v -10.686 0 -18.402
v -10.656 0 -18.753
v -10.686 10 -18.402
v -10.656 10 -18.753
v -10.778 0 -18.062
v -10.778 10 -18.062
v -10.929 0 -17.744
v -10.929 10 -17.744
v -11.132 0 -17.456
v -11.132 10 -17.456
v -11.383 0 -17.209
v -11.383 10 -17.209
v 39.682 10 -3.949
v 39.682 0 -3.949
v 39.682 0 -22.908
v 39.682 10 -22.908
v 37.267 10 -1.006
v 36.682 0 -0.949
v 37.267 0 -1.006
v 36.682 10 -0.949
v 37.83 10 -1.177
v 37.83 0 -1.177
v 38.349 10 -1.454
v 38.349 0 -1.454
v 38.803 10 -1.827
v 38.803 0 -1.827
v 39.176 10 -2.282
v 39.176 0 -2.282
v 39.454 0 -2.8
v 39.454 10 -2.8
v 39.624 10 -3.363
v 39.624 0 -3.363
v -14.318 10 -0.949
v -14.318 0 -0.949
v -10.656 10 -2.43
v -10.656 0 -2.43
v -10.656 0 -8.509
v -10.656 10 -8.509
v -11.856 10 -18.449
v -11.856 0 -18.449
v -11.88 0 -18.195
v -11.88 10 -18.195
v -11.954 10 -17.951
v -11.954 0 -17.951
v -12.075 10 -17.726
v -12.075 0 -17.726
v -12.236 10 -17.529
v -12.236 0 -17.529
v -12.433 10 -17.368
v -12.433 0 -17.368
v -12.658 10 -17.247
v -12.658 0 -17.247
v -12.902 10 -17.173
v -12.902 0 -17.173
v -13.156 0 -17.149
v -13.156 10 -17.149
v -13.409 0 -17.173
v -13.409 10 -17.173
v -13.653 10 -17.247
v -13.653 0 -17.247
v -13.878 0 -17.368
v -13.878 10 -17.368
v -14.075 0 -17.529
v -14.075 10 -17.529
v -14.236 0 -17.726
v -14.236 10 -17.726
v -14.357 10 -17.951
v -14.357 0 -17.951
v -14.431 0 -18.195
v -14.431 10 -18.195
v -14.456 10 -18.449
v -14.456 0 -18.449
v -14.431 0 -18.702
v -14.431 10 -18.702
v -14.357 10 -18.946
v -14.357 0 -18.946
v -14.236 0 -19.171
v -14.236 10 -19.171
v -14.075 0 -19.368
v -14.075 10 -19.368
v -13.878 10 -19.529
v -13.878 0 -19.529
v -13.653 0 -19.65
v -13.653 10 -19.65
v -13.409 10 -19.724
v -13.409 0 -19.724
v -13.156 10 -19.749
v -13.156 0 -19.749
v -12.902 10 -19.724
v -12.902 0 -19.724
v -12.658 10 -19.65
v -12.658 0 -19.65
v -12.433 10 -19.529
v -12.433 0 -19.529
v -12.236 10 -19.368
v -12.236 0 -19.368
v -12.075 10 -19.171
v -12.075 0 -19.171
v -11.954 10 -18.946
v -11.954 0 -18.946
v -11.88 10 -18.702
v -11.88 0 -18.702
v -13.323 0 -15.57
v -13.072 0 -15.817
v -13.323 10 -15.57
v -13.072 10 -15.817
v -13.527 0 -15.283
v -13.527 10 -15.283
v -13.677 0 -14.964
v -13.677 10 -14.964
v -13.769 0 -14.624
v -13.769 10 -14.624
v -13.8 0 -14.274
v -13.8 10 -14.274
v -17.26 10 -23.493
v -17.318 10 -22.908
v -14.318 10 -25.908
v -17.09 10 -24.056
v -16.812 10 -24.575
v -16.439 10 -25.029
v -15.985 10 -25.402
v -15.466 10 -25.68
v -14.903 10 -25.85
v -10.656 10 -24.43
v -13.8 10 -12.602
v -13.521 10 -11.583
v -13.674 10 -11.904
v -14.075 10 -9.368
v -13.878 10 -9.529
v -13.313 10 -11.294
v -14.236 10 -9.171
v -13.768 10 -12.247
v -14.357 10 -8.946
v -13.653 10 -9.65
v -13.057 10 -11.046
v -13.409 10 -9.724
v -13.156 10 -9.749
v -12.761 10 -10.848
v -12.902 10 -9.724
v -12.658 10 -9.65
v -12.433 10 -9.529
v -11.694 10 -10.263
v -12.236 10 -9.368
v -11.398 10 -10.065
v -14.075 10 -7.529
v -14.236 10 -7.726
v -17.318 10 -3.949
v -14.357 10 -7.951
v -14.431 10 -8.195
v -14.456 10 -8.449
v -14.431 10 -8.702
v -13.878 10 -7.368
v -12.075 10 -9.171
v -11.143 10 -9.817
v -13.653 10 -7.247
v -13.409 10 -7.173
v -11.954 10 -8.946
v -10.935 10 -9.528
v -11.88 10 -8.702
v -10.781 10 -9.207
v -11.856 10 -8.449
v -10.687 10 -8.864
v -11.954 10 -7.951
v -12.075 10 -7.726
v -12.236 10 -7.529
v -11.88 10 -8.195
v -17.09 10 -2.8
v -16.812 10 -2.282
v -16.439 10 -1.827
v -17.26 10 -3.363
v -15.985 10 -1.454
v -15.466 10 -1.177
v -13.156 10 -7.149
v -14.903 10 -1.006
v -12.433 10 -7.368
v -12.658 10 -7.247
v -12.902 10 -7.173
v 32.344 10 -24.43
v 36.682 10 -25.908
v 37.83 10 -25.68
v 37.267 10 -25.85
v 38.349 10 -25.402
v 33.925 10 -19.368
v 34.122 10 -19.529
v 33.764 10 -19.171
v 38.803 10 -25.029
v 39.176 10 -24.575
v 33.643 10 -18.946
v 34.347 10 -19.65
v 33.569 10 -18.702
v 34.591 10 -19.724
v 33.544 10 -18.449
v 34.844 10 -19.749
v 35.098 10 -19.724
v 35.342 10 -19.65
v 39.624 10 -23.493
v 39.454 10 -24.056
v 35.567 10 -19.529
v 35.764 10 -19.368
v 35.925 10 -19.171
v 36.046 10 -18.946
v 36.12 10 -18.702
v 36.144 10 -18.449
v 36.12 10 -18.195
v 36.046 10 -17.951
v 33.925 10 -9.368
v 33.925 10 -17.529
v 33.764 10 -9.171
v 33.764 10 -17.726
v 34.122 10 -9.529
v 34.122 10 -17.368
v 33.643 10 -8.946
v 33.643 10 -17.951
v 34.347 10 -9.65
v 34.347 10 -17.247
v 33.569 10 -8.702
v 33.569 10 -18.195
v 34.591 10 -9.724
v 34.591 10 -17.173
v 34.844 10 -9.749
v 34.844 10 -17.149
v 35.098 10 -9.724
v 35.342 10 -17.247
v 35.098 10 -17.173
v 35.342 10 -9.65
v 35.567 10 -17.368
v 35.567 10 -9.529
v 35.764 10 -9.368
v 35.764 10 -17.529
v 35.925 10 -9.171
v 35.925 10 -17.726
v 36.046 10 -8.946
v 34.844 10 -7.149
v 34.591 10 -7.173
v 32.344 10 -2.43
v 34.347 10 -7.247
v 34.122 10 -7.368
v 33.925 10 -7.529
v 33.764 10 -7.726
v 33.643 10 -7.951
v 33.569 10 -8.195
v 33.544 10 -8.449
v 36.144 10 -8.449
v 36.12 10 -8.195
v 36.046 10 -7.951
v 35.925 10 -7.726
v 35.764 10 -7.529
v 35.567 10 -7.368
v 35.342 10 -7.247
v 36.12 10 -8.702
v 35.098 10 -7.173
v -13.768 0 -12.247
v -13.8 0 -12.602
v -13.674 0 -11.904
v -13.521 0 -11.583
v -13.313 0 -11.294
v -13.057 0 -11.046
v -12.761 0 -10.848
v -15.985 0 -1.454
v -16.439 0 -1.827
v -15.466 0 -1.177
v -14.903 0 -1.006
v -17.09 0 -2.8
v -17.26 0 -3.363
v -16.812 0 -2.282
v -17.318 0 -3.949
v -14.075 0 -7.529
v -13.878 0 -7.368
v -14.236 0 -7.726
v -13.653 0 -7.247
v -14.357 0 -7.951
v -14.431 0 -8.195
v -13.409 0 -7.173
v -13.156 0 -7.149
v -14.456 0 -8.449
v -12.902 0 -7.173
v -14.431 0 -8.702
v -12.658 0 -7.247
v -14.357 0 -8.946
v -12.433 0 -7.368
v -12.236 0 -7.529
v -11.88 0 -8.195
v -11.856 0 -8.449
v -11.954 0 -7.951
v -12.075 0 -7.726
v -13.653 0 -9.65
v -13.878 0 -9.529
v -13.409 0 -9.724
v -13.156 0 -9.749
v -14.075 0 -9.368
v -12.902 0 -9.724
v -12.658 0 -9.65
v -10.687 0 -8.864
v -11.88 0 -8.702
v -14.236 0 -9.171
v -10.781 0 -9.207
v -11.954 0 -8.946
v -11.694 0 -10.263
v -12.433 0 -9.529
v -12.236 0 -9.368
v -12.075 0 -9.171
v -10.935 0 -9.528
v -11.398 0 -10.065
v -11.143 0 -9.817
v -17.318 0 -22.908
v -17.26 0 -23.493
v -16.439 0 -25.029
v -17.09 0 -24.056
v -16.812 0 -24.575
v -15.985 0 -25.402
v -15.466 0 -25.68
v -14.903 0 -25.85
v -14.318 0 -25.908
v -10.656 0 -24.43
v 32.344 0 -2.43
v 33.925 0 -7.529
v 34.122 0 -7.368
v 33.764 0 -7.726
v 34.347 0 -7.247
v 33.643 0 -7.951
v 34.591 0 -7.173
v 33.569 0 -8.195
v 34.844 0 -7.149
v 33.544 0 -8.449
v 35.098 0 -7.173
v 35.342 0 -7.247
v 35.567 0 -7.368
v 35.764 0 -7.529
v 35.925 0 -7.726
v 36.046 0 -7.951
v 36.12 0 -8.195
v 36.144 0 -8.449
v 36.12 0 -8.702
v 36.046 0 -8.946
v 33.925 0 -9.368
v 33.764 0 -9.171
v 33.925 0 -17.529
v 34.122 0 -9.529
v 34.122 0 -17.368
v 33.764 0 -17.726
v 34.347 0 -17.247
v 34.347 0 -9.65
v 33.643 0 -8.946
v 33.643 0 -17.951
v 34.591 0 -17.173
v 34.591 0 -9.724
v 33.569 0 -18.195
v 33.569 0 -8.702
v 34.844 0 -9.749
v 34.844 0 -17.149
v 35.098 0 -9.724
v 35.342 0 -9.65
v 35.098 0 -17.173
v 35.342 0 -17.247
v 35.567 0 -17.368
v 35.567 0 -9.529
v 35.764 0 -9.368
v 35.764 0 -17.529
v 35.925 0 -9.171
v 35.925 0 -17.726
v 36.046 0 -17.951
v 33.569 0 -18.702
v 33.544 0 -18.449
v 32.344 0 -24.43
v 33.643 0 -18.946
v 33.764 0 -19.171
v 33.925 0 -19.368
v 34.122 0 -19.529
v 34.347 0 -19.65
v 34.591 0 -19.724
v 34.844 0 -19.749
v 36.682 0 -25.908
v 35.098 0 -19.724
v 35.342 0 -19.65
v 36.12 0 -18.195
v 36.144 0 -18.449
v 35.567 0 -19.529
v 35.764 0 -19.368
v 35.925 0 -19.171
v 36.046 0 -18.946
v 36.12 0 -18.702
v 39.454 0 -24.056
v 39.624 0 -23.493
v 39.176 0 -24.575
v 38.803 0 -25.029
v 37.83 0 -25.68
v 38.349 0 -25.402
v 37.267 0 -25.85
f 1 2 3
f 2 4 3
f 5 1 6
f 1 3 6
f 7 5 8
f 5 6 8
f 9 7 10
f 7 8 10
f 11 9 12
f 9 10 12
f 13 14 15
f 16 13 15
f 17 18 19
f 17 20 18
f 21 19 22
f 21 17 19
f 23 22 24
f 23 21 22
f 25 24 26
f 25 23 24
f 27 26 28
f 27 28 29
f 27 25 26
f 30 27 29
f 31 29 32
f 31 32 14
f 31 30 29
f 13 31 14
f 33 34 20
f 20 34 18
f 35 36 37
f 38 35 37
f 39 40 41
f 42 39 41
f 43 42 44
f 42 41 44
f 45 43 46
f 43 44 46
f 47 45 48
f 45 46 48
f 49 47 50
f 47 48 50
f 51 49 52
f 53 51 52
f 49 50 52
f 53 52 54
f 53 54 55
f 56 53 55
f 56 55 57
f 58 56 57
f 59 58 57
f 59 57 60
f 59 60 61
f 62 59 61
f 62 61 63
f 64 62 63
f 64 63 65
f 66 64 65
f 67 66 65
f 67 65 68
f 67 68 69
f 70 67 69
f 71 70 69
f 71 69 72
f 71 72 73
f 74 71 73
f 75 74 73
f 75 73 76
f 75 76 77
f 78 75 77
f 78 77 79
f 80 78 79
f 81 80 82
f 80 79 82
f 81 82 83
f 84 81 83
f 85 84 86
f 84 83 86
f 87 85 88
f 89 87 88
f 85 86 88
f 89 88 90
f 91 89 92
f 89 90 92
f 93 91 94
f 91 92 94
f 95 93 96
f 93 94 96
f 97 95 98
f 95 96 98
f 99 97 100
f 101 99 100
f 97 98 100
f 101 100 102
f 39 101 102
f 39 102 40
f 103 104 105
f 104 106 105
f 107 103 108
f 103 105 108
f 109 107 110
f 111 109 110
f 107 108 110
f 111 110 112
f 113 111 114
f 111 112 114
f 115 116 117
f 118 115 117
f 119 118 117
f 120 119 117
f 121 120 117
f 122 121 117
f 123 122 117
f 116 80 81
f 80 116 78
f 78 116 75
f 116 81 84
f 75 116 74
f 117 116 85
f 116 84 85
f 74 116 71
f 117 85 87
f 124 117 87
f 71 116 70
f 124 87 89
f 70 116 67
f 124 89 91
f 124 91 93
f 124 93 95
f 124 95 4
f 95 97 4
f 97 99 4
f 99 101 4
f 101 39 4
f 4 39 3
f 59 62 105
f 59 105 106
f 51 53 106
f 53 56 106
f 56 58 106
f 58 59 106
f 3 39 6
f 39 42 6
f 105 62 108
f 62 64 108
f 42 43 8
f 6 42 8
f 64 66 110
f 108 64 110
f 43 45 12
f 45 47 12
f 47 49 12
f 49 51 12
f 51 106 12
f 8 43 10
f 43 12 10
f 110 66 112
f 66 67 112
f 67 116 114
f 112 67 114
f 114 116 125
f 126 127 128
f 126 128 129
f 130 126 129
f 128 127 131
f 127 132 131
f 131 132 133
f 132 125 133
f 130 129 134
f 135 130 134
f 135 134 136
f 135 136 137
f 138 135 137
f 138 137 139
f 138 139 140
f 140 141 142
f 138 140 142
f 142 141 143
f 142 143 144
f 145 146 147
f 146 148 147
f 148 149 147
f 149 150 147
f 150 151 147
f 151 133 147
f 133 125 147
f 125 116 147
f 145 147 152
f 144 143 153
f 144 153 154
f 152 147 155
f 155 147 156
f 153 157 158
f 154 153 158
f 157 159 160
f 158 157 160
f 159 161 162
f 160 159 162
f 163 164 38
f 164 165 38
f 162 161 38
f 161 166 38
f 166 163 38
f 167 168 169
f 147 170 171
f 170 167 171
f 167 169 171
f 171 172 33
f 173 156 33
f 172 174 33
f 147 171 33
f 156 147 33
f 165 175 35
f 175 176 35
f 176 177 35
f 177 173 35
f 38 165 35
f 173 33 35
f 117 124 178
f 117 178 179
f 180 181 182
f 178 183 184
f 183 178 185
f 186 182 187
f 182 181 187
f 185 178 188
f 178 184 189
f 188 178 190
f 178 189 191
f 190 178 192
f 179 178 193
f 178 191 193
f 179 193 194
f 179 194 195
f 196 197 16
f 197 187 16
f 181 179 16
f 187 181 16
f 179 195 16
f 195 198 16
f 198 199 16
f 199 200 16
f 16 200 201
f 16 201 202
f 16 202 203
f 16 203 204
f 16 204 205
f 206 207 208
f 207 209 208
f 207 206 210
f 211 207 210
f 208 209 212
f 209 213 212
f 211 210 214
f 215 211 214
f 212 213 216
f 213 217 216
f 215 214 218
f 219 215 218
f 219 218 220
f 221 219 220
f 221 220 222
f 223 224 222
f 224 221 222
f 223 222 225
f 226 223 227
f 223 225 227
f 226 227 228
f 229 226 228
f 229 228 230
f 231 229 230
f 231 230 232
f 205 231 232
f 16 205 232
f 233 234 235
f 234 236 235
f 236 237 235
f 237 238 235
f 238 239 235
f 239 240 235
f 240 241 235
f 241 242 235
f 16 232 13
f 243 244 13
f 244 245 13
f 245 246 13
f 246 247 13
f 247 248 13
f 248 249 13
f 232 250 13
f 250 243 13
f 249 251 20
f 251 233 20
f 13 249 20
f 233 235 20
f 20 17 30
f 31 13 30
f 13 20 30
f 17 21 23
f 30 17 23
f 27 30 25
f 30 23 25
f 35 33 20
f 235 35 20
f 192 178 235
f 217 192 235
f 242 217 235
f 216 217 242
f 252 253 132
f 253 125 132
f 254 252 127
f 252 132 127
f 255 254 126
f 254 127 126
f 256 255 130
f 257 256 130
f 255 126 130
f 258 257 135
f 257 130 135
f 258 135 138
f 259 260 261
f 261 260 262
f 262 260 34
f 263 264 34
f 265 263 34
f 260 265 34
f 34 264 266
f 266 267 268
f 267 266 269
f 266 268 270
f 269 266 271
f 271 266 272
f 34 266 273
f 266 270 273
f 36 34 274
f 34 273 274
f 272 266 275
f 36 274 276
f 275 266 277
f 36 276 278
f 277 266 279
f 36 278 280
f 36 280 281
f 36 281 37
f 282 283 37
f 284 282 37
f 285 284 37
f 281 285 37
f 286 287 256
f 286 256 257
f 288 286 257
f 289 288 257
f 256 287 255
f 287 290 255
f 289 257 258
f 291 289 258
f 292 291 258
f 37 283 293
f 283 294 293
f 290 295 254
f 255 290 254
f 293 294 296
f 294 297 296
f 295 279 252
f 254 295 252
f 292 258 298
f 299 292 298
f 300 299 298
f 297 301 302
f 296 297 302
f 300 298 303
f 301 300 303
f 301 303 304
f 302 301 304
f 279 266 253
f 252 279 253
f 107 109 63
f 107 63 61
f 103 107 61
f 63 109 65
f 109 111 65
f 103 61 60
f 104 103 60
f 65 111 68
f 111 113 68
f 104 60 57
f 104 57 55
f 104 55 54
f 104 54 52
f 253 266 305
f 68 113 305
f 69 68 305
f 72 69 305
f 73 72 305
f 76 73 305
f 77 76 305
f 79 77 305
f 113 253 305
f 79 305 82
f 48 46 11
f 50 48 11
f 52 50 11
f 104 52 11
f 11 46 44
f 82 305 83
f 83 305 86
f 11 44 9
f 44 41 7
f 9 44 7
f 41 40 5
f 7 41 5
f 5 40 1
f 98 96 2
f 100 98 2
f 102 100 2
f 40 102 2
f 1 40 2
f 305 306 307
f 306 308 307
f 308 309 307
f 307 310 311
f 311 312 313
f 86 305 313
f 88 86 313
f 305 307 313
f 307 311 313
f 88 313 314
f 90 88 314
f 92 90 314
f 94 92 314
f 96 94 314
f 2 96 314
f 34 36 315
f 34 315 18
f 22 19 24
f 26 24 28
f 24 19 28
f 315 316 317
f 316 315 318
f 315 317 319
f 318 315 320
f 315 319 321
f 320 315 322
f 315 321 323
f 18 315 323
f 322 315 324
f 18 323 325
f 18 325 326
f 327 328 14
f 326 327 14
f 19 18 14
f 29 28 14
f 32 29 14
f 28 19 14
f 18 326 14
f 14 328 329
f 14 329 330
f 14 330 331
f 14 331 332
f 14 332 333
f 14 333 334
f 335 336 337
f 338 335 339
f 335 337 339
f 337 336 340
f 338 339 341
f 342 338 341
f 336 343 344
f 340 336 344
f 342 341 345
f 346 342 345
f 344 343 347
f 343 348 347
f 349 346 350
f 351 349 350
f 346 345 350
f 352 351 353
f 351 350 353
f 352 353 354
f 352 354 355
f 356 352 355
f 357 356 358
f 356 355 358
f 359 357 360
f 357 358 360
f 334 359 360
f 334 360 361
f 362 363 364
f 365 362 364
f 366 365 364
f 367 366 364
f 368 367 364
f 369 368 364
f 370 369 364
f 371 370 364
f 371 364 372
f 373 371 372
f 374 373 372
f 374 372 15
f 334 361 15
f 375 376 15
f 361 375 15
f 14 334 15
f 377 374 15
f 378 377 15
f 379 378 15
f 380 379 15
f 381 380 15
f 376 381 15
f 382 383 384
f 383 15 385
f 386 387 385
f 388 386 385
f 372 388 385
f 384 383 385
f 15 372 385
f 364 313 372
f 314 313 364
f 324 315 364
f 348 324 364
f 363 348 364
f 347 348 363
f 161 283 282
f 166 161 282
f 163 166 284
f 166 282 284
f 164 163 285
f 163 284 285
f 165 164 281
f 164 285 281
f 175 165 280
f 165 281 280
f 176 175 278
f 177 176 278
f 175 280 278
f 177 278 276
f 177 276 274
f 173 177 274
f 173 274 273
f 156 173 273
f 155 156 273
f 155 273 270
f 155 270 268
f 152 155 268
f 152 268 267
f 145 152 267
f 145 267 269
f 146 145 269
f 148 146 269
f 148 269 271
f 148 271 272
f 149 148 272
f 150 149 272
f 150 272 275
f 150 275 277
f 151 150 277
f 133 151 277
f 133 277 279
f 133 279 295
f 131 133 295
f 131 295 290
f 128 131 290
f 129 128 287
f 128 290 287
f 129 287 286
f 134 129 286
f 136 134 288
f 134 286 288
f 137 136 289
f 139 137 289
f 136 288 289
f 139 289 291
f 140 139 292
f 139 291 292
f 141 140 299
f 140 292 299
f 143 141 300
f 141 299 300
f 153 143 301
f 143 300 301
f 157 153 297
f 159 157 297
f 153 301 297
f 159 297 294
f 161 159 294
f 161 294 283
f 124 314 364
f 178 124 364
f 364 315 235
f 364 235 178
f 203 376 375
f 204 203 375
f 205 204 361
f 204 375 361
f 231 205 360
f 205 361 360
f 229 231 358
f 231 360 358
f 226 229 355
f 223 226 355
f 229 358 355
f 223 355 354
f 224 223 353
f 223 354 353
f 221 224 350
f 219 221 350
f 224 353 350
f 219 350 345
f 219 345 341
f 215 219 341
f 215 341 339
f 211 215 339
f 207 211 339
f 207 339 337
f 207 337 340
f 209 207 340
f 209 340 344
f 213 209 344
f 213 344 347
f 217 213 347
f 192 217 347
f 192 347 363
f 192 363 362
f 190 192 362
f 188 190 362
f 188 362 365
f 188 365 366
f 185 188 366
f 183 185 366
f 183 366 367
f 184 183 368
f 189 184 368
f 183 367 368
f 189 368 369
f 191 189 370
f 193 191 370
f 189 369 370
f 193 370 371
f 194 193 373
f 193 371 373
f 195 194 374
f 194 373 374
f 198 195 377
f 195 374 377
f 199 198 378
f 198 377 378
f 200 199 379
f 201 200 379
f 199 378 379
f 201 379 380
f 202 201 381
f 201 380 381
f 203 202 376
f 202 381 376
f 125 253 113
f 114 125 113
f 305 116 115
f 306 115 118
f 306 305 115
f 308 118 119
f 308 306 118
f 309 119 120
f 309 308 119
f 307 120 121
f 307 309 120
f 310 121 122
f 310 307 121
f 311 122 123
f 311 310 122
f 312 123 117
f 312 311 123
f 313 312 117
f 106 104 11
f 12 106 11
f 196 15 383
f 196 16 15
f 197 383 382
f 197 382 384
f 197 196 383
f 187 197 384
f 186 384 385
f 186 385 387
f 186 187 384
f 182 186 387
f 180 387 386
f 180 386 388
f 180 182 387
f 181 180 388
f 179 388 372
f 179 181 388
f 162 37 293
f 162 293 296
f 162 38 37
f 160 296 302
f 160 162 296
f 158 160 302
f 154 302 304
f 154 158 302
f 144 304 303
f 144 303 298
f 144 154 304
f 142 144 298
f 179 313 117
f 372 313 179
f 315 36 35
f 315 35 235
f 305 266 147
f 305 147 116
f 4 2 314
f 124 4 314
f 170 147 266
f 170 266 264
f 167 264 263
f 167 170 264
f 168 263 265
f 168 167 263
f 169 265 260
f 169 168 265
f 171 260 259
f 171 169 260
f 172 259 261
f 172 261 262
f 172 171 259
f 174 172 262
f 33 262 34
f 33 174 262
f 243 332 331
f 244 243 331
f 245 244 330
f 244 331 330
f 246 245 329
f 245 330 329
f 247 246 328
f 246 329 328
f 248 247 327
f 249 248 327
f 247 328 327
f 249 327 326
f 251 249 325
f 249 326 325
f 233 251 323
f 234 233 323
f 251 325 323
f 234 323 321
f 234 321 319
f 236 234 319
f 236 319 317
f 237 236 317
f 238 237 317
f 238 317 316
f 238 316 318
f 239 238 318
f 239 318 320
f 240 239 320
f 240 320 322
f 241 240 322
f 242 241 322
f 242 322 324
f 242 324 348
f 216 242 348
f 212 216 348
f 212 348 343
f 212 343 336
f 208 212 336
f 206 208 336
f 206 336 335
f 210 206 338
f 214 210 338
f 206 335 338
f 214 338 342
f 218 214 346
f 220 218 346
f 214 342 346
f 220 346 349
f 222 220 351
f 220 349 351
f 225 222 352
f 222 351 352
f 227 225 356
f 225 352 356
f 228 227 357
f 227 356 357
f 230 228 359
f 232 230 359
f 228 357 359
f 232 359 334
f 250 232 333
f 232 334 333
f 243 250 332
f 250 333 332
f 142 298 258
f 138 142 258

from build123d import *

# Parameters (mm, degrees)
CROQUIS1_W              = 57
CROQUIS1_H              = 24.959470006
CROQUIS1_W_2            = 43
CROQUIS1_H_2            = 22
MAIN_DEPTH              = 28
CROQUIS2_W              = 27.955905163
CROQUIS2_H              = 20.987971864
CORTE_CAJA_DEPTH        = 24.95947
CROQUIS3_W              = 32
CROQUIS3_H              = 24.959470006
SALIENTE_EXTRUIR2_DEPTH = 2.25
REDONDEO_LATERALES_R    = 3
CROQUIS7_R              = 1.3
TALADROS_BASE_DEPTH     = 11
CAJEADO_CABLE_DEPTH     = 10
CAJEADO_REDONDEO_R      = 2
CORTAR_EXTRUIR1_DEPTH   = 24.95947


with BuildPart() as part:
    # Croquis1 → Main (new body)
    with BuildSketch(Plane(origin=(0, 0, 0), x_dir=(1, 0, 0), z_dir=(0, 1, 0))):
        with Locations((11.181999645, 13.428246359)):
            Rectangle(CROQUIS1_W, CROQUIS1_H)
        with Locations((10.844499645, 13.430306654)):
            Rectangle(CROQUIS1_W_2, CROQUIS1_H_2, mode=Mode.SUBTRACT)
    extrude(amount=MAIN_DEPTH)

    # Croquis2 → Corte Caja (cut)
    with BuildSketch(Plane.XY.offset(-0.948511356)):
        with Locations((28.659952227, 20.493985932)):
            Rectangle(CROQUIS2_W, CROQUIS2_H)
    extrude(amount=-CORTE_CAJA_DEPTH, mode=Mode.SUBTRACT)

    # Croquis3 → Saliente-Extruir2 (add)
    with BuildSketch(Plane(origin=(0, 28, 0), x_dir=(1, 0, 0), z_dir=(0, 1, 0))):
        with Locations((-1.318000355, 13.428246359)):
            Rectangle(CROQUIS3_W, CROQUIS3_H)
    extrude(amount=SALIENTE_EXTRUIR2_DEPTH)

    # Redondeo Laterales
    redondeo_laterales_edges = [part.edges().sort_by_distance(p)[0] for p in [
        (39.681999645, 5, -25.907981362),
        (39.681999645, 5, -0.948511356),
        (-17.318000355, 15.125, -25.907981362),
        (-17.318000355, 15.125, -0.948511356),
    ]]
    fillet(redondeo_laterales_edges, radius=REDONDEO_LATERALES_R)

    # Croquis7 → Taladros Base (cut)
    with BuildSketch(Plane.XZ):
        with Locations((-13.155500355, -8.448511356)):
            Circle(CROQUIS7_R)
        with Locations((-13.155500355, -18.448511356)):
            Circle(CROQUIS7_R)
        with Locations((34.844499645, -8.448511356)):
            Circle(CROQUIS7_R)
        with Locations((34.844499645, -18.448511356)):
            Circle(CROQUIS7_R)
    extrude(amount=-TALADROS_BASE_DEPTH, mode=Mode.SUBTRACT)

    # Croquis8 → Cajeado cable (cut)
    with BuildSketch(Plane.XZ):
        Polygon((-10.655500355, -17.809410949), (-10.655500355, -9.693483102), (-13.79985022, -11.41721999), (-13.79985022, -15.216689513), align=None)
    extrude(amount=-CAJEADO_CABLE_DEPTH, mode=Mode.SUBTRACT)

    # Cajeado Redondeo
    cajeado_redondeo_edges = [part.edges().sort_by_distance(p)[0] for p in [
        (-13.79985022, 5, -11.41721999),
        (-10.655500355, 5, -9.693483102),
        (-10.655500355, 5, -17.809410949),
        (-13.79985022, 5, -15.216689513),
    ]]
    fillet(cajeado_redondeo_edges, radius=CAJEADO_REDONDEO_R)

    # Croquis10 → Cortar-Extruir1 (cut)
    with BuildSketch(Plane.XY.offset(-0.948511356)):
        Polygon((-18.751407395, 10), (41.252258099, 10), (41.252258099, 38.904482254), (-18.751407395, 38.904482254), (-18.751407395, 38.898632989), align=None)
    extrude(amount=-CORTAR_EXTRUIR1_DEPTH, mode=Mode.SUBTRACT)


solid = part.part
